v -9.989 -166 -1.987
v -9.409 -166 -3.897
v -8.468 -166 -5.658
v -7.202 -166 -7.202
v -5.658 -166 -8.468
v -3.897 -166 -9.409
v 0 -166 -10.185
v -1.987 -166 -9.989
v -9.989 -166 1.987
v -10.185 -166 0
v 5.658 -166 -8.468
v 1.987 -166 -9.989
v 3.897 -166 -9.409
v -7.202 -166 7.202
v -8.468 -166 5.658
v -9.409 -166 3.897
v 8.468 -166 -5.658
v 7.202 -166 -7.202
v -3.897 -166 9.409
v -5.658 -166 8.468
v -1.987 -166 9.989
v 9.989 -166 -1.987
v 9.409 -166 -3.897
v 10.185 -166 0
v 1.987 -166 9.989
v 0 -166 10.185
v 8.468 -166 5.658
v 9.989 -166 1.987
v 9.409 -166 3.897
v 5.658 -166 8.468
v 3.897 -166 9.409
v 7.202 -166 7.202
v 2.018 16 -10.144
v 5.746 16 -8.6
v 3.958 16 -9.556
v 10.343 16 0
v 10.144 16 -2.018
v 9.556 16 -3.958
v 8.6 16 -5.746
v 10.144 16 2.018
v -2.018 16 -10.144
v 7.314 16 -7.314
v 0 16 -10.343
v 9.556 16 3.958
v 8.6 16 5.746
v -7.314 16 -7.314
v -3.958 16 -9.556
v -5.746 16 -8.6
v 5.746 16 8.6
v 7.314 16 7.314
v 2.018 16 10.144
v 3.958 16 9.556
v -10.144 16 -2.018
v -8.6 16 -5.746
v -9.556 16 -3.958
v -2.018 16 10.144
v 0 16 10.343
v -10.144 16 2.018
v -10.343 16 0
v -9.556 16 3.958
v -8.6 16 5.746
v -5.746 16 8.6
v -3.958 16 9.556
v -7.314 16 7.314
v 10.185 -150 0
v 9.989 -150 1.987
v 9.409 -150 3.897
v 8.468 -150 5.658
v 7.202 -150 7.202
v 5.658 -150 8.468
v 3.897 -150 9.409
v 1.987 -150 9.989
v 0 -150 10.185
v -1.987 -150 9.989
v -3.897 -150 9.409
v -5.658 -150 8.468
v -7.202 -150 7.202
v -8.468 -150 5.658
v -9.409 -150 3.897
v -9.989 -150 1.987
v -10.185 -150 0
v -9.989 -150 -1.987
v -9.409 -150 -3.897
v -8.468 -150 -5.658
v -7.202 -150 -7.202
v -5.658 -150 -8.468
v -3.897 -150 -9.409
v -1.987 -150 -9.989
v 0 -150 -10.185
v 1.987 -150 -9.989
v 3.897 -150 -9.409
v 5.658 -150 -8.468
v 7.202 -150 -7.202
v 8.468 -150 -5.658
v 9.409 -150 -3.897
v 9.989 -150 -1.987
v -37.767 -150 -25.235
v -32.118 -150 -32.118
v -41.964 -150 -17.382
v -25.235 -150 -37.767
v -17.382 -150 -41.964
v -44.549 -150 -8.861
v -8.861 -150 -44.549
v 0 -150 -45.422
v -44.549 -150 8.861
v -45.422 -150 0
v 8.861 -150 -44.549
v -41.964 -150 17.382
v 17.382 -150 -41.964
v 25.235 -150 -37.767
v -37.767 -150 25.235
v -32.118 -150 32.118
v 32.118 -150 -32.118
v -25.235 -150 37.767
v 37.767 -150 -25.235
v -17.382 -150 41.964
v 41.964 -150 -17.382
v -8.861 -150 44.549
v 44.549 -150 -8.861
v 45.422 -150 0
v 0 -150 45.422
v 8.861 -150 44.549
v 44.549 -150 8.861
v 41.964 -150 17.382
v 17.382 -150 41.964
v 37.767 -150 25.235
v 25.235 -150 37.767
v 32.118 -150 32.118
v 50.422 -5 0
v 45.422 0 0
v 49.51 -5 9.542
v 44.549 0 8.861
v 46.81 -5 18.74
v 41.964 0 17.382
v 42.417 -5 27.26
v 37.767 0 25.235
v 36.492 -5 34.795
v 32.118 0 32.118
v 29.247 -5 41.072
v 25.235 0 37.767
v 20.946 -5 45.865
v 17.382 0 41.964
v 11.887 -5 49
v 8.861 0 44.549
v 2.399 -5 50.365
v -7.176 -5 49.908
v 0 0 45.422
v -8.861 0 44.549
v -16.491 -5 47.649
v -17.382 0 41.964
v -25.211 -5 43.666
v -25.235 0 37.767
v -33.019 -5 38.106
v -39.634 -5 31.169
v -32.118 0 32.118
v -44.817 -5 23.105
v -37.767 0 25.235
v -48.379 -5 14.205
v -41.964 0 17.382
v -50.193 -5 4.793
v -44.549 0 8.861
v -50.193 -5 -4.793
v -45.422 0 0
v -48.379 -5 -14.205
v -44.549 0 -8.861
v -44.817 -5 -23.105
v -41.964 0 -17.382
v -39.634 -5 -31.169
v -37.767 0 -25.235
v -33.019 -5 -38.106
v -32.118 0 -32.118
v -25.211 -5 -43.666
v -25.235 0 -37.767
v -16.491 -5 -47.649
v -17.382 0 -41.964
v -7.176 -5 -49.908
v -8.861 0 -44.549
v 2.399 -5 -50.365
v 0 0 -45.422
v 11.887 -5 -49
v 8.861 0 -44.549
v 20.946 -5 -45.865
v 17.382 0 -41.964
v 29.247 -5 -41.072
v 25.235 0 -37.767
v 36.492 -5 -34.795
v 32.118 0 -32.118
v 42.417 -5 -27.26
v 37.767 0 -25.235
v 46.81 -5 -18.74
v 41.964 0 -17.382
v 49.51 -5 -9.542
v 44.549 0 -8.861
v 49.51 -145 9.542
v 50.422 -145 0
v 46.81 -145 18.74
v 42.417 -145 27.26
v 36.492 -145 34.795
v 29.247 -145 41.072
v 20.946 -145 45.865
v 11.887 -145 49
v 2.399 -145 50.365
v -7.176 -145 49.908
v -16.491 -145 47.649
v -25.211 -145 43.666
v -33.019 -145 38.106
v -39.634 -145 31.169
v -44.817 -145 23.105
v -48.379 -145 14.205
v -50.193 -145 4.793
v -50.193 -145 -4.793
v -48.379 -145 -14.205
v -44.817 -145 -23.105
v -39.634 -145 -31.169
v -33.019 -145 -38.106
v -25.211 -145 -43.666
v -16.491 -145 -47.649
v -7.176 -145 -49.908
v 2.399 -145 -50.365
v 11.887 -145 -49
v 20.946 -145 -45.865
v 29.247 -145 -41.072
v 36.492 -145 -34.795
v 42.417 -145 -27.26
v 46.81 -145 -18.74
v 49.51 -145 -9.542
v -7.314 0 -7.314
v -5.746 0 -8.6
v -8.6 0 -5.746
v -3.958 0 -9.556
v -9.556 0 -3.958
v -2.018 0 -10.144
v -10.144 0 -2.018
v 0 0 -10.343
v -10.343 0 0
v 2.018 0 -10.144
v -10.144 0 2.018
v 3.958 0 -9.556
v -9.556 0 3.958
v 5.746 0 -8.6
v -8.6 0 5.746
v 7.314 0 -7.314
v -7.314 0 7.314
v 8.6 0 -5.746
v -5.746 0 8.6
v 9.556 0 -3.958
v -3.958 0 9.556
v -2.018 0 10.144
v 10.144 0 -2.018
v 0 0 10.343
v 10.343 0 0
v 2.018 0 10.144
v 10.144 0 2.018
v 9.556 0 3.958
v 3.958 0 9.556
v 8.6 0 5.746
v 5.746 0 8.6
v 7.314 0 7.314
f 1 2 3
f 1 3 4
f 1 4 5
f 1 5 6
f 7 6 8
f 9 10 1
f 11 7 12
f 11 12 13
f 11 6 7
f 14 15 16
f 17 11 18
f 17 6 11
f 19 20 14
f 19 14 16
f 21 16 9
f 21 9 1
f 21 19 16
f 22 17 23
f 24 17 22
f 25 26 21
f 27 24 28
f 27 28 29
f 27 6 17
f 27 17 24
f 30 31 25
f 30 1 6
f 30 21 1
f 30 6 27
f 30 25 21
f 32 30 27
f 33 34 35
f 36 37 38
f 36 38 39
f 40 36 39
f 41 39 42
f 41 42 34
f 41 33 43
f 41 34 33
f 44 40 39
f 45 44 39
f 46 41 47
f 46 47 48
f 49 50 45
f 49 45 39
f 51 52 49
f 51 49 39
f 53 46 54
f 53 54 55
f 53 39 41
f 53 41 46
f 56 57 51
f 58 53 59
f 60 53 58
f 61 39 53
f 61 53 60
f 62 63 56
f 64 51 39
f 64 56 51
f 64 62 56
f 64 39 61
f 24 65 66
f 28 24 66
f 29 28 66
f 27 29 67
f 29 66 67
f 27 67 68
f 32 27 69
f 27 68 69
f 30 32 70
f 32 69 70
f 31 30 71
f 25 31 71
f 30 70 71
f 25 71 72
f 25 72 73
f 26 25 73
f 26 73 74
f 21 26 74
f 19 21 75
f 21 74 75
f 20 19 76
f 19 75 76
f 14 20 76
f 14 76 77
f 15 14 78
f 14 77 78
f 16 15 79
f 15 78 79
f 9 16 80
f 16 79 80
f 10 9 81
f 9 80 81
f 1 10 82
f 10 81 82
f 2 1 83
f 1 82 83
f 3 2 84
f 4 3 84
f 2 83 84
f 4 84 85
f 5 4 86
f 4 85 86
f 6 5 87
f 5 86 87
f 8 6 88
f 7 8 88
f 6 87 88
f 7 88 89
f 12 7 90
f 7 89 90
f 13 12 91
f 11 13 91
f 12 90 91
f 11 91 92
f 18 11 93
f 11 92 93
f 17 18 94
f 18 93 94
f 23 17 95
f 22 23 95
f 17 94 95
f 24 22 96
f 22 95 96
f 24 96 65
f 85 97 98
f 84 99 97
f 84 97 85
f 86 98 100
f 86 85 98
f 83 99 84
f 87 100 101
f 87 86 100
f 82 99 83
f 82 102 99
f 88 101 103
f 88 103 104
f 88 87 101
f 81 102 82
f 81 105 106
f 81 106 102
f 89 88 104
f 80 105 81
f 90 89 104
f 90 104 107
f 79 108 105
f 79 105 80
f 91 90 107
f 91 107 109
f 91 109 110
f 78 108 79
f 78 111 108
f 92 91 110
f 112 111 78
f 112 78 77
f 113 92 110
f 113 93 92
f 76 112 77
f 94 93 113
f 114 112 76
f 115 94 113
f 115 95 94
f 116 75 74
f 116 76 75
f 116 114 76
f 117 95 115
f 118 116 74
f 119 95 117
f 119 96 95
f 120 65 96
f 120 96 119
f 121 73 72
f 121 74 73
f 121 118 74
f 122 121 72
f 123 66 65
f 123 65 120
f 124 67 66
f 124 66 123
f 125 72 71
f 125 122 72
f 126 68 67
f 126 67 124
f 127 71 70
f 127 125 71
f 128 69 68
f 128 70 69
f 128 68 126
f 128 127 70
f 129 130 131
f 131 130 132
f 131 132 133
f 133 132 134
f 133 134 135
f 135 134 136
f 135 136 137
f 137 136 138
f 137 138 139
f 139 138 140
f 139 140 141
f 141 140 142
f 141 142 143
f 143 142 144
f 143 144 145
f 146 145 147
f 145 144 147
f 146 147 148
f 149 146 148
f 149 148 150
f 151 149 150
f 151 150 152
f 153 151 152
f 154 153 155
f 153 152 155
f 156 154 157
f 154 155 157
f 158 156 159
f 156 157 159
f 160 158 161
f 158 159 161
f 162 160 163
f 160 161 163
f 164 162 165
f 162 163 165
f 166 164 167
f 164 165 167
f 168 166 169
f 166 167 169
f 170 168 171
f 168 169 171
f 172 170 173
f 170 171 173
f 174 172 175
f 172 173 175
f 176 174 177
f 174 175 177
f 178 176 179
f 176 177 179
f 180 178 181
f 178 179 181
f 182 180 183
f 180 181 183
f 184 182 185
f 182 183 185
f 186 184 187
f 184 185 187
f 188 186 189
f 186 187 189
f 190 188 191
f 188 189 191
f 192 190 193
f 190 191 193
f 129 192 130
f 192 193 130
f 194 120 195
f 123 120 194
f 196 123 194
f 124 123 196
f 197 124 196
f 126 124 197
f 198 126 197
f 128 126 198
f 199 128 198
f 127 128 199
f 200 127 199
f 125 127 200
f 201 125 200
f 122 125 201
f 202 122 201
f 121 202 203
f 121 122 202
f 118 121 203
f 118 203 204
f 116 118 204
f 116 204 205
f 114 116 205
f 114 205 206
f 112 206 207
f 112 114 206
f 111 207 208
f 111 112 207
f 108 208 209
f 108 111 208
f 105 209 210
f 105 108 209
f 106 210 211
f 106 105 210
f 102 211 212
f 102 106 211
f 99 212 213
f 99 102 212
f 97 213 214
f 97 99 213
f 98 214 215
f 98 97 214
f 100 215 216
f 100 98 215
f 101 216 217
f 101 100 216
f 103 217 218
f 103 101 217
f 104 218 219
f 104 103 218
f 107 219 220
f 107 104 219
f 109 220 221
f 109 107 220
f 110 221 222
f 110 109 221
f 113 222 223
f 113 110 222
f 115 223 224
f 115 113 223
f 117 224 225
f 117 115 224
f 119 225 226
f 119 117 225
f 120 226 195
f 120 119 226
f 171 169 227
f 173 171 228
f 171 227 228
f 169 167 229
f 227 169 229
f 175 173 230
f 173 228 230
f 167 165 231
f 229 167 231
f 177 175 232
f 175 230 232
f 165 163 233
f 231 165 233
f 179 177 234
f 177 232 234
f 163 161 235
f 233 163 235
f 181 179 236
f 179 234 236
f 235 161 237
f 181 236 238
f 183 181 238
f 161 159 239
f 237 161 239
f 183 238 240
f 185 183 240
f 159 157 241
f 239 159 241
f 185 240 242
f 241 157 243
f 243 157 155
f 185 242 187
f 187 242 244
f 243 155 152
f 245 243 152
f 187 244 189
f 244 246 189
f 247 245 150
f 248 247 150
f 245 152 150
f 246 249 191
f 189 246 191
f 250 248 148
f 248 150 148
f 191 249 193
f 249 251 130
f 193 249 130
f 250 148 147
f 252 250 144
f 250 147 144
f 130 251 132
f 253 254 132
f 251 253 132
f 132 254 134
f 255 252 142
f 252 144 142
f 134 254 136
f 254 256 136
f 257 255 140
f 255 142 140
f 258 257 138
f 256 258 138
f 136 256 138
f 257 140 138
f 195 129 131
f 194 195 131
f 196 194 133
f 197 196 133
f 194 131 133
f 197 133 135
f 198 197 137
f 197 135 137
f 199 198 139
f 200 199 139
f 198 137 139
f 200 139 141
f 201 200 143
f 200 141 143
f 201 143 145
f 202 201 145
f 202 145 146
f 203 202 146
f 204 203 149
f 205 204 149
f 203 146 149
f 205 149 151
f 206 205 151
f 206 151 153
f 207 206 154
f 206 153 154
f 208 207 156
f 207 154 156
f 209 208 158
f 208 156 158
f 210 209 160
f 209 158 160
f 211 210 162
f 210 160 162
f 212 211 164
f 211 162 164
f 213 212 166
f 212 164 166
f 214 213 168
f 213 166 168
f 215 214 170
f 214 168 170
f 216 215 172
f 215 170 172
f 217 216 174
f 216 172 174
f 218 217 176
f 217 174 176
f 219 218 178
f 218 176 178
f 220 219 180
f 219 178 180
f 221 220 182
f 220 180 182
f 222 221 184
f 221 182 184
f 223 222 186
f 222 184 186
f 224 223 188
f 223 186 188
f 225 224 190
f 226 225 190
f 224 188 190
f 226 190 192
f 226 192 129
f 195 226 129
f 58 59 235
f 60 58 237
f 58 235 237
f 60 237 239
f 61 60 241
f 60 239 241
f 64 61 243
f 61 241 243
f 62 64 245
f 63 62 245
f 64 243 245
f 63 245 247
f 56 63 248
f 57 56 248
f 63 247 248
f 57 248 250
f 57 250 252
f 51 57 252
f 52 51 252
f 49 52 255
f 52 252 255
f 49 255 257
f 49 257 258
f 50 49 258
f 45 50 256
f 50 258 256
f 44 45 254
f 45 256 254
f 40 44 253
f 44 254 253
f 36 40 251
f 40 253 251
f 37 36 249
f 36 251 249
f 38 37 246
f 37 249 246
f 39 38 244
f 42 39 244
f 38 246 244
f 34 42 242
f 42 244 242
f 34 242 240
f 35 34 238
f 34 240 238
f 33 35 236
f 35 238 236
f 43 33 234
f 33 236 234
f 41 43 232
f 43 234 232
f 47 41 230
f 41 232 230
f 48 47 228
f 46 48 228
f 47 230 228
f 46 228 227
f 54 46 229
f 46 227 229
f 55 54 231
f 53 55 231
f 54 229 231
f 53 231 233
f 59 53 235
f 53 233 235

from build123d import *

# Parameters (mm, degrees)
F0_R     = 50.421677
F1_DEPTH = 150
F2_SIZE  = 5
F3_R     = 10.184595
F4_DEPTH = 16
F5_SIZE  = 5
F6_R     = 10.343213
F7_DEPTH = 16


with BuildPart() as f1:
    # F0 (on Front) → F1 (new body)
    with BuildSketch(Plane.XZ):
        Circle(F0_R)
    extrude(amount=F1_DEPTH)

    # F2
    f2_edges = [f1.edges().sort_by_distance(p)[0] for p in [
        (-50.421677, -150, 0),
    ]]
    chamfer(f2_edges, length=F2_SIZE)

    # F3 (on face) → F4 (join)
    with BuildSketch(Plane.XZ.offset(150)):
        Circle(F3_R)
    extrude(amount=F4_DEPTH)

    # F5
    f5_edges = [f1.edges().sort_by_distance(p)[0] for p in [
        (-50.421677, 0, 0),
    ]]
    chamfer(f5_edges, length=F5_SIZE)

    # F6 (on face) → F7 (join)
    with BuildSketch(Plane(origin=(0, 0, 0), x_dir=(-1, 0, 0), z_dir=(0, 1, 0))):
        Circle(F6_R)
    extrude(amount=F7_DEPTH)


solid = f1.part
